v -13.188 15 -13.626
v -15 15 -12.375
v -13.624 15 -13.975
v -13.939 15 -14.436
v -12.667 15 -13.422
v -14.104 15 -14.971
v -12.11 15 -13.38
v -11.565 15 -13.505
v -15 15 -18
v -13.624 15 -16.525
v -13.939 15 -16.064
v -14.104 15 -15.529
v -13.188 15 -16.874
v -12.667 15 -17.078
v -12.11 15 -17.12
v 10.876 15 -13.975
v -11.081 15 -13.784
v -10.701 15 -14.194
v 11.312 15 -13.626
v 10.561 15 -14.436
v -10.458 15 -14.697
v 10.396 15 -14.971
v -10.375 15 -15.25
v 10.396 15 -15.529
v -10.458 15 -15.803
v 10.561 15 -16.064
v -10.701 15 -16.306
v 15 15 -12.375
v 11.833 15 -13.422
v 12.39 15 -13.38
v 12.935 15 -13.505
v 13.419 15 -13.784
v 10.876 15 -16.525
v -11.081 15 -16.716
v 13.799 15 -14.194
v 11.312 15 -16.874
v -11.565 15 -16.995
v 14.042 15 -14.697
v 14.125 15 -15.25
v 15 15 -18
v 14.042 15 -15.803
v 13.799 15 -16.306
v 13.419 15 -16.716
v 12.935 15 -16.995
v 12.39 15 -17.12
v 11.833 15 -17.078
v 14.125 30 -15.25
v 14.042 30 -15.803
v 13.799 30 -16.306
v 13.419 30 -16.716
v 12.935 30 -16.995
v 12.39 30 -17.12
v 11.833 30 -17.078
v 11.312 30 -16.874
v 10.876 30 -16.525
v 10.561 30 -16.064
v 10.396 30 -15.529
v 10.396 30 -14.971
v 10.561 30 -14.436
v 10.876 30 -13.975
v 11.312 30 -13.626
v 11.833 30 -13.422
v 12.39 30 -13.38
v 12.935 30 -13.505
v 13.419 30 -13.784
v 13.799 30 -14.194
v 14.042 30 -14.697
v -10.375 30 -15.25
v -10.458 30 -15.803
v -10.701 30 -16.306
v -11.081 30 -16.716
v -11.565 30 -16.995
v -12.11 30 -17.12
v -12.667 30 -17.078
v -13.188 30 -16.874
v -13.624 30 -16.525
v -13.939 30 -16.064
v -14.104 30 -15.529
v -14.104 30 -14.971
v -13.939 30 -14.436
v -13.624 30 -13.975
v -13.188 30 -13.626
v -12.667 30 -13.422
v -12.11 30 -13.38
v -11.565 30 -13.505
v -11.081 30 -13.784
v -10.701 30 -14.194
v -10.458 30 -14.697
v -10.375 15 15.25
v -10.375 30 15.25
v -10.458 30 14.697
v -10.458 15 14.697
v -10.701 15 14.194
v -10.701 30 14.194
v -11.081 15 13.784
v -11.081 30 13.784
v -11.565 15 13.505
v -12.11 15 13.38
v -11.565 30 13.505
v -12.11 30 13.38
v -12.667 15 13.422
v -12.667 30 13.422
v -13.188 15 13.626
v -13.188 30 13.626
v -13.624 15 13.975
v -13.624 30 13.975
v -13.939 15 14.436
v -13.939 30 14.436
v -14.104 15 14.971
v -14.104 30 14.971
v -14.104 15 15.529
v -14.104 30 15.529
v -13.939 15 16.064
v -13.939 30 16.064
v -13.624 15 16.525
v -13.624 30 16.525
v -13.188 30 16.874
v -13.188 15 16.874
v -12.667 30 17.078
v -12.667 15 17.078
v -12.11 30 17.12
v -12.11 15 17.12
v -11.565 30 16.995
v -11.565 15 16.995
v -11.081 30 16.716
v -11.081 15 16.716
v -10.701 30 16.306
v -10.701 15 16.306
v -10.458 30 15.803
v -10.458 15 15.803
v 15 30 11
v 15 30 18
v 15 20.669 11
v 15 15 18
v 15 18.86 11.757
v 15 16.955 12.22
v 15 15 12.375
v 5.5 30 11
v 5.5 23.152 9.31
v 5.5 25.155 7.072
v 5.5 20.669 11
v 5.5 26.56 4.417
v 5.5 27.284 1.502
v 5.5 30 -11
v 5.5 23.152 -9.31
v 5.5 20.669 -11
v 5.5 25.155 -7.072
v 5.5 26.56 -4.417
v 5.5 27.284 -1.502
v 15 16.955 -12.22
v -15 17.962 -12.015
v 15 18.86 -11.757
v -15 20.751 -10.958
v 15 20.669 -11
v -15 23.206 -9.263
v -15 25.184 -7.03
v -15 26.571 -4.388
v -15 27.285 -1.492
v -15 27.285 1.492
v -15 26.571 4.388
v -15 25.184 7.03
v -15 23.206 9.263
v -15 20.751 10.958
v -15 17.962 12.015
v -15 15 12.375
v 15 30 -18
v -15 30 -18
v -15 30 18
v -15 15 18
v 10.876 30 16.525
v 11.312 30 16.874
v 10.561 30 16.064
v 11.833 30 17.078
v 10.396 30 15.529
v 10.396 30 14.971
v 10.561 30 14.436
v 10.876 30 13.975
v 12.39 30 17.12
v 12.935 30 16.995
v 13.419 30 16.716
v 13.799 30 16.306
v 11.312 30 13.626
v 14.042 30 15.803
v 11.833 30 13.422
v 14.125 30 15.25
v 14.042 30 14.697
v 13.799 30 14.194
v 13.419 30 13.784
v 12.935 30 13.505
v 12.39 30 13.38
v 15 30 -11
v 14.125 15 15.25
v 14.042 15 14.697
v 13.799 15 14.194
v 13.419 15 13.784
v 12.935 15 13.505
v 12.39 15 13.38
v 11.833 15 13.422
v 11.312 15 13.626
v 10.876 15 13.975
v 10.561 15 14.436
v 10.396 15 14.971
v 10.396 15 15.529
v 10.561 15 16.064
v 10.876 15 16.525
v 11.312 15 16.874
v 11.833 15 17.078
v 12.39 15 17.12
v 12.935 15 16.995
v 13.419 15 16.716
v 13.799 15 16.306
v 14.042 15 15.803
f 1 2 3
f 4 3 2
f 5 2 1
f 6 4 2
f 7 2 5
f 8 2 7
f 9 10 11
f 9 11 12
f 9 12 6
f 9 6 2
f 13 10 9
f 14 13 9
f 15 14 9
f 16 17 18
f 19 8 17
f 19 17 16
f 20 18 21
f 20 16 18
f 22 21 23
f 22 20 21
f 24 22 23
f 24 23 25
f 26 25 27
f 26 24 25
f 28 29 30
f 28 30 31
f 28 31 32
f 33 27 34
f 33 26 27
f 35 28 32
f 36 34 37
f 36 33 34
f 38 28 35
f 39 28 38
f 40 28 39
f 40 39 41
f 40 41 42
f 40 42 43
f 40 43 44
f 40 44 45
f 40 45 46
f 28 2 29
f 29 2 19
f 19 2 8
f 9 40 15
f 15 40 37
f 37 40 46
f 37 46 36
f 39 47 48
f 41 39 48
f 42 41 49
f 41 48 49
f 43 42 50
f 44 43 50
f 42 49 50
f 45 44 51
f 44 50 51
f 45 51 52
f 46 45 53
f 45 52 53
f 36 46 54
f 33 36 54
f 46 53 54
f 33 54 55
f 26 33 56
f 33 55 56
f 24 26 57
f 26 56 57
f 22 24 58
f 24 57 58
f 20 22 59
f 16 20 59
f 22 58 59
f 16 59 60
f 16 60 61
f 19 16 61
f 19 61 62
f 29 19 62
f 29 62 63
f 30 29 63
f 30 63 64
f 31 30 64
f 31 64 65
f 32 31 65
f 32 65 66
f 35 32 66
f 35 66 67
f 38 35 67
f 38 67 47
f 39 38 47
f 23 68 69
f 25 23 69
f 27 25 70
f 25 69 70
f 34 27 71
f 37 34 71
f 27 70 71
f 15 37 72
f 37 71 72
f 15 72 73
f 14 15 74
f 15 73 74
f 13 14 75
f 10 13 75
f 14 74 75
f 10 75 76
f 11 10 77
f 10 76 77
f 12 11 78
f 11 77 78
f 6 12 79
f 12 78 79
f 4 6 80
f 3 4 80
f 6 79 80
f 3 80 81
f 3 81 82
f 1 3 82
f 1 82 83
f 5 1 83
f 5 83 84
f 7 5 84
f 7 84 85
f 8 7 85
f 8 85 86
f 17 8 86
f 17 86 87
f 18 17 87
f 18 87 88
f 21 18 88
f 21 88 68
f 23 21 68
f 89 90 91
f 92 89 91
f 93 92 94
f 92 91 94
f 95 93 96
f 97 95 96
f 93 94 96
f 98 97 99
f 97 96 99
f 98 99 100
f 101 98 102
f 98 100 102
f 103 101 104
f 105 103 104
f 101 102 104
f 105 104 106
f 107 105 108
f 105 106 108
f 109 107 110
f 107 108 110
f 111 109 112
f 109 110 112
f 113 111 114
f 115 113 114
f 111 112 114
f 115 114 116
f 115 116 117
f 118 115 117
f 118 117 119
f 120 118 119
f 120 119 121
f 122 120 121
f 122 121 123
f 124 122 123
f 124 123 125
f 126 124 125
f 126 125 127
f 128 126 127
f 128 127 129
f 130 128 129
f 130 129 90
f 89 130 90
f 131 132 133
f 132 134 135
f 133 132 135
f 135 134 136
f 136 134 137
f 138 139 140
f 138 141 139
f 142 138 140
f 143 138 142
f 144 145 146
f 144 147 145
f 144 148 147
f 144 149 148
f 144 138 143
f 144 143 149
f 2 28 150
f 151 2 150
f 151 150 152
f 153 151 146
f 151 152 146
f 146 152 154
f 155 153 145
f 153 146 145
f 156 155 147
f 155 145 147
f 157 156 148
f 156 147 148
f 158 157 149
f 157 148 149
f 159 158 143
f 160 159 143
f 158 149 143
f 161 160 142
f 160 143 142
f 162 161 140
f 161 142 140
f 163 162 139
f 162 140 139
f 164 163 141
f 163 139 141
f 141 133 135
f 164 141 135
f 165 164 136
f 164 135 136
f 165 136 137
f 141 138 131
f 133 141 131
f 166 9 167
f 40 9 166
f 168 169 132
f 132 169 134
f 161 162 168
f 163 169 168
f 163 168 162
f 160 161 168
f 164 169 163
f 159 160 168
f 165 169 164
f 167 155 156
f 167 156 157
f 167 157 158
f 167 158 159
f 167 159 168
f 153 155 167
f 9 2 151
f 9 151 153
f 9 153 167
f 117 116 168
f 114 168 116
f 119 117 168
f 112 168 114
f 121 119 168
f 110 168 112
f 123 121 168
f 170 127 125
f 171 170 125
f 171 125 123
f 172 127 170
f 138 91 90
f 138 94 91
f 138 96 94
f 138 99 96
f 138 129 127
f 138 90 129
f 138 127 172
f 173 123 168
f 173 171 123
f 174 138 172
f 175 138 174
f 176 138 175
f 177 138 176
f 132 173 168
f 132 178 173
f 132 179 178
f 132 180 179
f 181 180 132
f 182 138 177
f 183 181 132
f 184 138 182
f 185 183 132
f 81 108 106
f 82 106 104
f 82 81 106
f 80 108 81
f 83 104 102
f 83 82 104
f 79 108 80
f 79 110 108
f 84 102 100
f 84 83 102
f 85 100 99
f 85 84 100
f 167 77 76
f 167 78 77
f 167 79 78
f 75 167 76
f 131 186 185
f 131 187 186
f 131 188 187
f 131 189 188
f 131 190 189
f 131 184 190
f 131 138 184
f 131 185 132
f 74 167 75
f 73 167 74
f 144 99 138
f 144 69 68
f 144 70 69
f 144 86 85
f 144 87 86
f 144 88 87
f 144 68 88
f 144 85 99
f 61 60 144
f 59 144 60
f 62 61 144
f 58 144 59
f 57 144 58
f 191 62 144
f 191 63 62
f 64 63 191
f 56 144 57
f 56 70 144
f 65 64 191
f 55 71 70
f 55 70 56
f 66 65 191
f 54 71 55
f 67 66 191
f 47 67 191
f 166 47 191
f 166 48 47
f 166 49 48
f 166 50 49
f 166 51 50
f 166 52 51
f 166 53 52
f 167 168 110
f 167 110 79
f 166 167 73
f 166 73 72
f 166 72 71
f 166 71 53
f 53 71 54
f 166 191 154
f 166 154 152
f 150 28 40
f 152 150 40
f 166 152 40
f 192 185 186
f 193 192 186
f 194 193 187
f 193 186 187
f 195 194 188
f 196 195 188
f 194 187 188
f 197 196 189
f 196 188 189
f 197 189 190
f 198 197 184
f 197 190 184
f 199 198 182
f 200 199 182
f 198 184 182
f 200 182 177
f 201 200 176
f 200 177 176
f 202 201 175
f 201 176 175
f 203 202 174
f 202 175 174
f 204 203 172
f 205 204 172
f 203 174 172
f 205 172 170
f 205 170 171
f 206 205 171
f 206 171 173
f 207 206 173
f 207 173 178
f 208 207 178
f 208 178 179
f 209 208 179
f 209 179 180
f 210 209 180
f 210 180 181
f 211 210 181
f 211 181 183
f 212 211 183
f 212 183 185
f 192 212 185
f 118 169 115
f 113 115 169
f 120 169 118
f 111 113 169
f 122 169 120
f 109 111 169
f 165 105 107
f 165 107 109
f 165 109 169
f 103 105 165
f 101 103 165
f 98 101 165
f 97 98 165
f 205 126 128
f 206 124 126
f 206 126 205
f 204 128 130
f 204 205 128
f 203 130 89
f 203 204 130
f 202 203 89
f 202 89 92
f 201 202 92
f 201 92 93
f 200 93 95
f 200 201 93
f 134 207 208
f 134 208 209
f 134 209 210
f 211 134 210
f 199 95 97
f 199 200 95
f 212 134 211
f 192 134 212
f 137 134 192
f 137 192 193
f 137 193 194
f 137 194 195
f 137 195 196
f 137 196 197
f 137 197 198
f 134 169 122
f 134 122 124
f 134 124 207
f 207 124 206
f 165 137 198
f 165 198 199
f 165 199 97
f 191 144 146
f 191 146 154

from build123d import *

# Parameters (mm, degrees)
SKETCH1_W           = 30
SKETCH1_H           = 36
BOSS_EXTRUDE1_DEPTH = 30
SKETCH3_R           = 12.375
CUT_EXTRUDE1_DEPTH  = 40
SKETCH5_R           = 1.875
CUT_EXTRUDE2_DEPTH  = 40
CUT_EXTRUDE3_START  = 15
SKETCH7_W           = 36
SKETCH7_H           = 15
CUT_EXTRUDE3_DEPTH  = 31
SKETCH8_W           = 9.5
SKETCH8_H           = 22
CUT_EXTRUDE4_DEPTH  = 10


with BuildPart() as part:
    # Sketch1 → Boss-Extrude1 (new body)
    with BuildSketch(Plane(origin=(0, 0, 0), x_dir=(1, 0, 0), z_dir=(0, 1, 0))):
        Rectangle(SKETCH1_W, SKETCH1_H)
    extrude(amount=BOSS_EXTRUDE1_DEPTH)

    # Sketch3 → Cut-Extrude1 (cut)
    with BuildSketch(Plane(origin=(15, 0, 0), x_dir=(0, 0, -1), z_dir=(1, 0, 0))):
        with Locations((0, 15)):
            Circle(SKETCH3_R)
    extrude(amount=-CUT_EXTRUDE1_DEPTH, mode=Mode.SUBTRACT)

    # Sketch5 → Cut-Extrude2 (cut)
    with BuildSketch(Plane(origin=(0, 30, 0), x_dir=(1, 0, 0), z_dir=(0, 1, 0))):
        with Locations((-12.25, 15.25)):
            Circle(SKETCH5_R)
        with Locations((-12.25, -15.25)):
            Circle(SKETCH5_R)
        with Locations((12.25, -15.25)):
            Circle(SKETCH5_R)
        with Locations((12.25, 15.25)):
            Circle(SKETCH5_R)
    extrude(amount=-CUT_EXTRUDE2_DEPTH, mode=Mode.SUBTRACT)

    # Sketch7 → Cut-Extrude3 (cut, through all)
    with BuildSketch(Plane(origin=(0, 0, 0), x_dir=(0, 0, -1), z_dir=(1, 0, 0)).offset(CUT_EXTRUDE3_START)):
        with Locations((0, 7.5)):
            Rectangle(SKETCH7_W, SKETCH7_H)
    extrude(amount=-CUT_EXTRUDE3_DEPTH, mode=Mode.SUBTRACT)

    # Sketch8 → Cut-Extrude4 (cut)
    with BuildSketch(Plane(origin=(0, 30, 0), x_dir=(1, 0, 0), z_dir=(0, 1, 0))):
        with Locations((10.25, 0)):
            Rectangle(SKETCH8_W, SKETCH8_H)
    extrude(amount=-CUT_EXTRUDE4_DEPTH, mode=Mode.SUBTRACT)


solid = part.part
